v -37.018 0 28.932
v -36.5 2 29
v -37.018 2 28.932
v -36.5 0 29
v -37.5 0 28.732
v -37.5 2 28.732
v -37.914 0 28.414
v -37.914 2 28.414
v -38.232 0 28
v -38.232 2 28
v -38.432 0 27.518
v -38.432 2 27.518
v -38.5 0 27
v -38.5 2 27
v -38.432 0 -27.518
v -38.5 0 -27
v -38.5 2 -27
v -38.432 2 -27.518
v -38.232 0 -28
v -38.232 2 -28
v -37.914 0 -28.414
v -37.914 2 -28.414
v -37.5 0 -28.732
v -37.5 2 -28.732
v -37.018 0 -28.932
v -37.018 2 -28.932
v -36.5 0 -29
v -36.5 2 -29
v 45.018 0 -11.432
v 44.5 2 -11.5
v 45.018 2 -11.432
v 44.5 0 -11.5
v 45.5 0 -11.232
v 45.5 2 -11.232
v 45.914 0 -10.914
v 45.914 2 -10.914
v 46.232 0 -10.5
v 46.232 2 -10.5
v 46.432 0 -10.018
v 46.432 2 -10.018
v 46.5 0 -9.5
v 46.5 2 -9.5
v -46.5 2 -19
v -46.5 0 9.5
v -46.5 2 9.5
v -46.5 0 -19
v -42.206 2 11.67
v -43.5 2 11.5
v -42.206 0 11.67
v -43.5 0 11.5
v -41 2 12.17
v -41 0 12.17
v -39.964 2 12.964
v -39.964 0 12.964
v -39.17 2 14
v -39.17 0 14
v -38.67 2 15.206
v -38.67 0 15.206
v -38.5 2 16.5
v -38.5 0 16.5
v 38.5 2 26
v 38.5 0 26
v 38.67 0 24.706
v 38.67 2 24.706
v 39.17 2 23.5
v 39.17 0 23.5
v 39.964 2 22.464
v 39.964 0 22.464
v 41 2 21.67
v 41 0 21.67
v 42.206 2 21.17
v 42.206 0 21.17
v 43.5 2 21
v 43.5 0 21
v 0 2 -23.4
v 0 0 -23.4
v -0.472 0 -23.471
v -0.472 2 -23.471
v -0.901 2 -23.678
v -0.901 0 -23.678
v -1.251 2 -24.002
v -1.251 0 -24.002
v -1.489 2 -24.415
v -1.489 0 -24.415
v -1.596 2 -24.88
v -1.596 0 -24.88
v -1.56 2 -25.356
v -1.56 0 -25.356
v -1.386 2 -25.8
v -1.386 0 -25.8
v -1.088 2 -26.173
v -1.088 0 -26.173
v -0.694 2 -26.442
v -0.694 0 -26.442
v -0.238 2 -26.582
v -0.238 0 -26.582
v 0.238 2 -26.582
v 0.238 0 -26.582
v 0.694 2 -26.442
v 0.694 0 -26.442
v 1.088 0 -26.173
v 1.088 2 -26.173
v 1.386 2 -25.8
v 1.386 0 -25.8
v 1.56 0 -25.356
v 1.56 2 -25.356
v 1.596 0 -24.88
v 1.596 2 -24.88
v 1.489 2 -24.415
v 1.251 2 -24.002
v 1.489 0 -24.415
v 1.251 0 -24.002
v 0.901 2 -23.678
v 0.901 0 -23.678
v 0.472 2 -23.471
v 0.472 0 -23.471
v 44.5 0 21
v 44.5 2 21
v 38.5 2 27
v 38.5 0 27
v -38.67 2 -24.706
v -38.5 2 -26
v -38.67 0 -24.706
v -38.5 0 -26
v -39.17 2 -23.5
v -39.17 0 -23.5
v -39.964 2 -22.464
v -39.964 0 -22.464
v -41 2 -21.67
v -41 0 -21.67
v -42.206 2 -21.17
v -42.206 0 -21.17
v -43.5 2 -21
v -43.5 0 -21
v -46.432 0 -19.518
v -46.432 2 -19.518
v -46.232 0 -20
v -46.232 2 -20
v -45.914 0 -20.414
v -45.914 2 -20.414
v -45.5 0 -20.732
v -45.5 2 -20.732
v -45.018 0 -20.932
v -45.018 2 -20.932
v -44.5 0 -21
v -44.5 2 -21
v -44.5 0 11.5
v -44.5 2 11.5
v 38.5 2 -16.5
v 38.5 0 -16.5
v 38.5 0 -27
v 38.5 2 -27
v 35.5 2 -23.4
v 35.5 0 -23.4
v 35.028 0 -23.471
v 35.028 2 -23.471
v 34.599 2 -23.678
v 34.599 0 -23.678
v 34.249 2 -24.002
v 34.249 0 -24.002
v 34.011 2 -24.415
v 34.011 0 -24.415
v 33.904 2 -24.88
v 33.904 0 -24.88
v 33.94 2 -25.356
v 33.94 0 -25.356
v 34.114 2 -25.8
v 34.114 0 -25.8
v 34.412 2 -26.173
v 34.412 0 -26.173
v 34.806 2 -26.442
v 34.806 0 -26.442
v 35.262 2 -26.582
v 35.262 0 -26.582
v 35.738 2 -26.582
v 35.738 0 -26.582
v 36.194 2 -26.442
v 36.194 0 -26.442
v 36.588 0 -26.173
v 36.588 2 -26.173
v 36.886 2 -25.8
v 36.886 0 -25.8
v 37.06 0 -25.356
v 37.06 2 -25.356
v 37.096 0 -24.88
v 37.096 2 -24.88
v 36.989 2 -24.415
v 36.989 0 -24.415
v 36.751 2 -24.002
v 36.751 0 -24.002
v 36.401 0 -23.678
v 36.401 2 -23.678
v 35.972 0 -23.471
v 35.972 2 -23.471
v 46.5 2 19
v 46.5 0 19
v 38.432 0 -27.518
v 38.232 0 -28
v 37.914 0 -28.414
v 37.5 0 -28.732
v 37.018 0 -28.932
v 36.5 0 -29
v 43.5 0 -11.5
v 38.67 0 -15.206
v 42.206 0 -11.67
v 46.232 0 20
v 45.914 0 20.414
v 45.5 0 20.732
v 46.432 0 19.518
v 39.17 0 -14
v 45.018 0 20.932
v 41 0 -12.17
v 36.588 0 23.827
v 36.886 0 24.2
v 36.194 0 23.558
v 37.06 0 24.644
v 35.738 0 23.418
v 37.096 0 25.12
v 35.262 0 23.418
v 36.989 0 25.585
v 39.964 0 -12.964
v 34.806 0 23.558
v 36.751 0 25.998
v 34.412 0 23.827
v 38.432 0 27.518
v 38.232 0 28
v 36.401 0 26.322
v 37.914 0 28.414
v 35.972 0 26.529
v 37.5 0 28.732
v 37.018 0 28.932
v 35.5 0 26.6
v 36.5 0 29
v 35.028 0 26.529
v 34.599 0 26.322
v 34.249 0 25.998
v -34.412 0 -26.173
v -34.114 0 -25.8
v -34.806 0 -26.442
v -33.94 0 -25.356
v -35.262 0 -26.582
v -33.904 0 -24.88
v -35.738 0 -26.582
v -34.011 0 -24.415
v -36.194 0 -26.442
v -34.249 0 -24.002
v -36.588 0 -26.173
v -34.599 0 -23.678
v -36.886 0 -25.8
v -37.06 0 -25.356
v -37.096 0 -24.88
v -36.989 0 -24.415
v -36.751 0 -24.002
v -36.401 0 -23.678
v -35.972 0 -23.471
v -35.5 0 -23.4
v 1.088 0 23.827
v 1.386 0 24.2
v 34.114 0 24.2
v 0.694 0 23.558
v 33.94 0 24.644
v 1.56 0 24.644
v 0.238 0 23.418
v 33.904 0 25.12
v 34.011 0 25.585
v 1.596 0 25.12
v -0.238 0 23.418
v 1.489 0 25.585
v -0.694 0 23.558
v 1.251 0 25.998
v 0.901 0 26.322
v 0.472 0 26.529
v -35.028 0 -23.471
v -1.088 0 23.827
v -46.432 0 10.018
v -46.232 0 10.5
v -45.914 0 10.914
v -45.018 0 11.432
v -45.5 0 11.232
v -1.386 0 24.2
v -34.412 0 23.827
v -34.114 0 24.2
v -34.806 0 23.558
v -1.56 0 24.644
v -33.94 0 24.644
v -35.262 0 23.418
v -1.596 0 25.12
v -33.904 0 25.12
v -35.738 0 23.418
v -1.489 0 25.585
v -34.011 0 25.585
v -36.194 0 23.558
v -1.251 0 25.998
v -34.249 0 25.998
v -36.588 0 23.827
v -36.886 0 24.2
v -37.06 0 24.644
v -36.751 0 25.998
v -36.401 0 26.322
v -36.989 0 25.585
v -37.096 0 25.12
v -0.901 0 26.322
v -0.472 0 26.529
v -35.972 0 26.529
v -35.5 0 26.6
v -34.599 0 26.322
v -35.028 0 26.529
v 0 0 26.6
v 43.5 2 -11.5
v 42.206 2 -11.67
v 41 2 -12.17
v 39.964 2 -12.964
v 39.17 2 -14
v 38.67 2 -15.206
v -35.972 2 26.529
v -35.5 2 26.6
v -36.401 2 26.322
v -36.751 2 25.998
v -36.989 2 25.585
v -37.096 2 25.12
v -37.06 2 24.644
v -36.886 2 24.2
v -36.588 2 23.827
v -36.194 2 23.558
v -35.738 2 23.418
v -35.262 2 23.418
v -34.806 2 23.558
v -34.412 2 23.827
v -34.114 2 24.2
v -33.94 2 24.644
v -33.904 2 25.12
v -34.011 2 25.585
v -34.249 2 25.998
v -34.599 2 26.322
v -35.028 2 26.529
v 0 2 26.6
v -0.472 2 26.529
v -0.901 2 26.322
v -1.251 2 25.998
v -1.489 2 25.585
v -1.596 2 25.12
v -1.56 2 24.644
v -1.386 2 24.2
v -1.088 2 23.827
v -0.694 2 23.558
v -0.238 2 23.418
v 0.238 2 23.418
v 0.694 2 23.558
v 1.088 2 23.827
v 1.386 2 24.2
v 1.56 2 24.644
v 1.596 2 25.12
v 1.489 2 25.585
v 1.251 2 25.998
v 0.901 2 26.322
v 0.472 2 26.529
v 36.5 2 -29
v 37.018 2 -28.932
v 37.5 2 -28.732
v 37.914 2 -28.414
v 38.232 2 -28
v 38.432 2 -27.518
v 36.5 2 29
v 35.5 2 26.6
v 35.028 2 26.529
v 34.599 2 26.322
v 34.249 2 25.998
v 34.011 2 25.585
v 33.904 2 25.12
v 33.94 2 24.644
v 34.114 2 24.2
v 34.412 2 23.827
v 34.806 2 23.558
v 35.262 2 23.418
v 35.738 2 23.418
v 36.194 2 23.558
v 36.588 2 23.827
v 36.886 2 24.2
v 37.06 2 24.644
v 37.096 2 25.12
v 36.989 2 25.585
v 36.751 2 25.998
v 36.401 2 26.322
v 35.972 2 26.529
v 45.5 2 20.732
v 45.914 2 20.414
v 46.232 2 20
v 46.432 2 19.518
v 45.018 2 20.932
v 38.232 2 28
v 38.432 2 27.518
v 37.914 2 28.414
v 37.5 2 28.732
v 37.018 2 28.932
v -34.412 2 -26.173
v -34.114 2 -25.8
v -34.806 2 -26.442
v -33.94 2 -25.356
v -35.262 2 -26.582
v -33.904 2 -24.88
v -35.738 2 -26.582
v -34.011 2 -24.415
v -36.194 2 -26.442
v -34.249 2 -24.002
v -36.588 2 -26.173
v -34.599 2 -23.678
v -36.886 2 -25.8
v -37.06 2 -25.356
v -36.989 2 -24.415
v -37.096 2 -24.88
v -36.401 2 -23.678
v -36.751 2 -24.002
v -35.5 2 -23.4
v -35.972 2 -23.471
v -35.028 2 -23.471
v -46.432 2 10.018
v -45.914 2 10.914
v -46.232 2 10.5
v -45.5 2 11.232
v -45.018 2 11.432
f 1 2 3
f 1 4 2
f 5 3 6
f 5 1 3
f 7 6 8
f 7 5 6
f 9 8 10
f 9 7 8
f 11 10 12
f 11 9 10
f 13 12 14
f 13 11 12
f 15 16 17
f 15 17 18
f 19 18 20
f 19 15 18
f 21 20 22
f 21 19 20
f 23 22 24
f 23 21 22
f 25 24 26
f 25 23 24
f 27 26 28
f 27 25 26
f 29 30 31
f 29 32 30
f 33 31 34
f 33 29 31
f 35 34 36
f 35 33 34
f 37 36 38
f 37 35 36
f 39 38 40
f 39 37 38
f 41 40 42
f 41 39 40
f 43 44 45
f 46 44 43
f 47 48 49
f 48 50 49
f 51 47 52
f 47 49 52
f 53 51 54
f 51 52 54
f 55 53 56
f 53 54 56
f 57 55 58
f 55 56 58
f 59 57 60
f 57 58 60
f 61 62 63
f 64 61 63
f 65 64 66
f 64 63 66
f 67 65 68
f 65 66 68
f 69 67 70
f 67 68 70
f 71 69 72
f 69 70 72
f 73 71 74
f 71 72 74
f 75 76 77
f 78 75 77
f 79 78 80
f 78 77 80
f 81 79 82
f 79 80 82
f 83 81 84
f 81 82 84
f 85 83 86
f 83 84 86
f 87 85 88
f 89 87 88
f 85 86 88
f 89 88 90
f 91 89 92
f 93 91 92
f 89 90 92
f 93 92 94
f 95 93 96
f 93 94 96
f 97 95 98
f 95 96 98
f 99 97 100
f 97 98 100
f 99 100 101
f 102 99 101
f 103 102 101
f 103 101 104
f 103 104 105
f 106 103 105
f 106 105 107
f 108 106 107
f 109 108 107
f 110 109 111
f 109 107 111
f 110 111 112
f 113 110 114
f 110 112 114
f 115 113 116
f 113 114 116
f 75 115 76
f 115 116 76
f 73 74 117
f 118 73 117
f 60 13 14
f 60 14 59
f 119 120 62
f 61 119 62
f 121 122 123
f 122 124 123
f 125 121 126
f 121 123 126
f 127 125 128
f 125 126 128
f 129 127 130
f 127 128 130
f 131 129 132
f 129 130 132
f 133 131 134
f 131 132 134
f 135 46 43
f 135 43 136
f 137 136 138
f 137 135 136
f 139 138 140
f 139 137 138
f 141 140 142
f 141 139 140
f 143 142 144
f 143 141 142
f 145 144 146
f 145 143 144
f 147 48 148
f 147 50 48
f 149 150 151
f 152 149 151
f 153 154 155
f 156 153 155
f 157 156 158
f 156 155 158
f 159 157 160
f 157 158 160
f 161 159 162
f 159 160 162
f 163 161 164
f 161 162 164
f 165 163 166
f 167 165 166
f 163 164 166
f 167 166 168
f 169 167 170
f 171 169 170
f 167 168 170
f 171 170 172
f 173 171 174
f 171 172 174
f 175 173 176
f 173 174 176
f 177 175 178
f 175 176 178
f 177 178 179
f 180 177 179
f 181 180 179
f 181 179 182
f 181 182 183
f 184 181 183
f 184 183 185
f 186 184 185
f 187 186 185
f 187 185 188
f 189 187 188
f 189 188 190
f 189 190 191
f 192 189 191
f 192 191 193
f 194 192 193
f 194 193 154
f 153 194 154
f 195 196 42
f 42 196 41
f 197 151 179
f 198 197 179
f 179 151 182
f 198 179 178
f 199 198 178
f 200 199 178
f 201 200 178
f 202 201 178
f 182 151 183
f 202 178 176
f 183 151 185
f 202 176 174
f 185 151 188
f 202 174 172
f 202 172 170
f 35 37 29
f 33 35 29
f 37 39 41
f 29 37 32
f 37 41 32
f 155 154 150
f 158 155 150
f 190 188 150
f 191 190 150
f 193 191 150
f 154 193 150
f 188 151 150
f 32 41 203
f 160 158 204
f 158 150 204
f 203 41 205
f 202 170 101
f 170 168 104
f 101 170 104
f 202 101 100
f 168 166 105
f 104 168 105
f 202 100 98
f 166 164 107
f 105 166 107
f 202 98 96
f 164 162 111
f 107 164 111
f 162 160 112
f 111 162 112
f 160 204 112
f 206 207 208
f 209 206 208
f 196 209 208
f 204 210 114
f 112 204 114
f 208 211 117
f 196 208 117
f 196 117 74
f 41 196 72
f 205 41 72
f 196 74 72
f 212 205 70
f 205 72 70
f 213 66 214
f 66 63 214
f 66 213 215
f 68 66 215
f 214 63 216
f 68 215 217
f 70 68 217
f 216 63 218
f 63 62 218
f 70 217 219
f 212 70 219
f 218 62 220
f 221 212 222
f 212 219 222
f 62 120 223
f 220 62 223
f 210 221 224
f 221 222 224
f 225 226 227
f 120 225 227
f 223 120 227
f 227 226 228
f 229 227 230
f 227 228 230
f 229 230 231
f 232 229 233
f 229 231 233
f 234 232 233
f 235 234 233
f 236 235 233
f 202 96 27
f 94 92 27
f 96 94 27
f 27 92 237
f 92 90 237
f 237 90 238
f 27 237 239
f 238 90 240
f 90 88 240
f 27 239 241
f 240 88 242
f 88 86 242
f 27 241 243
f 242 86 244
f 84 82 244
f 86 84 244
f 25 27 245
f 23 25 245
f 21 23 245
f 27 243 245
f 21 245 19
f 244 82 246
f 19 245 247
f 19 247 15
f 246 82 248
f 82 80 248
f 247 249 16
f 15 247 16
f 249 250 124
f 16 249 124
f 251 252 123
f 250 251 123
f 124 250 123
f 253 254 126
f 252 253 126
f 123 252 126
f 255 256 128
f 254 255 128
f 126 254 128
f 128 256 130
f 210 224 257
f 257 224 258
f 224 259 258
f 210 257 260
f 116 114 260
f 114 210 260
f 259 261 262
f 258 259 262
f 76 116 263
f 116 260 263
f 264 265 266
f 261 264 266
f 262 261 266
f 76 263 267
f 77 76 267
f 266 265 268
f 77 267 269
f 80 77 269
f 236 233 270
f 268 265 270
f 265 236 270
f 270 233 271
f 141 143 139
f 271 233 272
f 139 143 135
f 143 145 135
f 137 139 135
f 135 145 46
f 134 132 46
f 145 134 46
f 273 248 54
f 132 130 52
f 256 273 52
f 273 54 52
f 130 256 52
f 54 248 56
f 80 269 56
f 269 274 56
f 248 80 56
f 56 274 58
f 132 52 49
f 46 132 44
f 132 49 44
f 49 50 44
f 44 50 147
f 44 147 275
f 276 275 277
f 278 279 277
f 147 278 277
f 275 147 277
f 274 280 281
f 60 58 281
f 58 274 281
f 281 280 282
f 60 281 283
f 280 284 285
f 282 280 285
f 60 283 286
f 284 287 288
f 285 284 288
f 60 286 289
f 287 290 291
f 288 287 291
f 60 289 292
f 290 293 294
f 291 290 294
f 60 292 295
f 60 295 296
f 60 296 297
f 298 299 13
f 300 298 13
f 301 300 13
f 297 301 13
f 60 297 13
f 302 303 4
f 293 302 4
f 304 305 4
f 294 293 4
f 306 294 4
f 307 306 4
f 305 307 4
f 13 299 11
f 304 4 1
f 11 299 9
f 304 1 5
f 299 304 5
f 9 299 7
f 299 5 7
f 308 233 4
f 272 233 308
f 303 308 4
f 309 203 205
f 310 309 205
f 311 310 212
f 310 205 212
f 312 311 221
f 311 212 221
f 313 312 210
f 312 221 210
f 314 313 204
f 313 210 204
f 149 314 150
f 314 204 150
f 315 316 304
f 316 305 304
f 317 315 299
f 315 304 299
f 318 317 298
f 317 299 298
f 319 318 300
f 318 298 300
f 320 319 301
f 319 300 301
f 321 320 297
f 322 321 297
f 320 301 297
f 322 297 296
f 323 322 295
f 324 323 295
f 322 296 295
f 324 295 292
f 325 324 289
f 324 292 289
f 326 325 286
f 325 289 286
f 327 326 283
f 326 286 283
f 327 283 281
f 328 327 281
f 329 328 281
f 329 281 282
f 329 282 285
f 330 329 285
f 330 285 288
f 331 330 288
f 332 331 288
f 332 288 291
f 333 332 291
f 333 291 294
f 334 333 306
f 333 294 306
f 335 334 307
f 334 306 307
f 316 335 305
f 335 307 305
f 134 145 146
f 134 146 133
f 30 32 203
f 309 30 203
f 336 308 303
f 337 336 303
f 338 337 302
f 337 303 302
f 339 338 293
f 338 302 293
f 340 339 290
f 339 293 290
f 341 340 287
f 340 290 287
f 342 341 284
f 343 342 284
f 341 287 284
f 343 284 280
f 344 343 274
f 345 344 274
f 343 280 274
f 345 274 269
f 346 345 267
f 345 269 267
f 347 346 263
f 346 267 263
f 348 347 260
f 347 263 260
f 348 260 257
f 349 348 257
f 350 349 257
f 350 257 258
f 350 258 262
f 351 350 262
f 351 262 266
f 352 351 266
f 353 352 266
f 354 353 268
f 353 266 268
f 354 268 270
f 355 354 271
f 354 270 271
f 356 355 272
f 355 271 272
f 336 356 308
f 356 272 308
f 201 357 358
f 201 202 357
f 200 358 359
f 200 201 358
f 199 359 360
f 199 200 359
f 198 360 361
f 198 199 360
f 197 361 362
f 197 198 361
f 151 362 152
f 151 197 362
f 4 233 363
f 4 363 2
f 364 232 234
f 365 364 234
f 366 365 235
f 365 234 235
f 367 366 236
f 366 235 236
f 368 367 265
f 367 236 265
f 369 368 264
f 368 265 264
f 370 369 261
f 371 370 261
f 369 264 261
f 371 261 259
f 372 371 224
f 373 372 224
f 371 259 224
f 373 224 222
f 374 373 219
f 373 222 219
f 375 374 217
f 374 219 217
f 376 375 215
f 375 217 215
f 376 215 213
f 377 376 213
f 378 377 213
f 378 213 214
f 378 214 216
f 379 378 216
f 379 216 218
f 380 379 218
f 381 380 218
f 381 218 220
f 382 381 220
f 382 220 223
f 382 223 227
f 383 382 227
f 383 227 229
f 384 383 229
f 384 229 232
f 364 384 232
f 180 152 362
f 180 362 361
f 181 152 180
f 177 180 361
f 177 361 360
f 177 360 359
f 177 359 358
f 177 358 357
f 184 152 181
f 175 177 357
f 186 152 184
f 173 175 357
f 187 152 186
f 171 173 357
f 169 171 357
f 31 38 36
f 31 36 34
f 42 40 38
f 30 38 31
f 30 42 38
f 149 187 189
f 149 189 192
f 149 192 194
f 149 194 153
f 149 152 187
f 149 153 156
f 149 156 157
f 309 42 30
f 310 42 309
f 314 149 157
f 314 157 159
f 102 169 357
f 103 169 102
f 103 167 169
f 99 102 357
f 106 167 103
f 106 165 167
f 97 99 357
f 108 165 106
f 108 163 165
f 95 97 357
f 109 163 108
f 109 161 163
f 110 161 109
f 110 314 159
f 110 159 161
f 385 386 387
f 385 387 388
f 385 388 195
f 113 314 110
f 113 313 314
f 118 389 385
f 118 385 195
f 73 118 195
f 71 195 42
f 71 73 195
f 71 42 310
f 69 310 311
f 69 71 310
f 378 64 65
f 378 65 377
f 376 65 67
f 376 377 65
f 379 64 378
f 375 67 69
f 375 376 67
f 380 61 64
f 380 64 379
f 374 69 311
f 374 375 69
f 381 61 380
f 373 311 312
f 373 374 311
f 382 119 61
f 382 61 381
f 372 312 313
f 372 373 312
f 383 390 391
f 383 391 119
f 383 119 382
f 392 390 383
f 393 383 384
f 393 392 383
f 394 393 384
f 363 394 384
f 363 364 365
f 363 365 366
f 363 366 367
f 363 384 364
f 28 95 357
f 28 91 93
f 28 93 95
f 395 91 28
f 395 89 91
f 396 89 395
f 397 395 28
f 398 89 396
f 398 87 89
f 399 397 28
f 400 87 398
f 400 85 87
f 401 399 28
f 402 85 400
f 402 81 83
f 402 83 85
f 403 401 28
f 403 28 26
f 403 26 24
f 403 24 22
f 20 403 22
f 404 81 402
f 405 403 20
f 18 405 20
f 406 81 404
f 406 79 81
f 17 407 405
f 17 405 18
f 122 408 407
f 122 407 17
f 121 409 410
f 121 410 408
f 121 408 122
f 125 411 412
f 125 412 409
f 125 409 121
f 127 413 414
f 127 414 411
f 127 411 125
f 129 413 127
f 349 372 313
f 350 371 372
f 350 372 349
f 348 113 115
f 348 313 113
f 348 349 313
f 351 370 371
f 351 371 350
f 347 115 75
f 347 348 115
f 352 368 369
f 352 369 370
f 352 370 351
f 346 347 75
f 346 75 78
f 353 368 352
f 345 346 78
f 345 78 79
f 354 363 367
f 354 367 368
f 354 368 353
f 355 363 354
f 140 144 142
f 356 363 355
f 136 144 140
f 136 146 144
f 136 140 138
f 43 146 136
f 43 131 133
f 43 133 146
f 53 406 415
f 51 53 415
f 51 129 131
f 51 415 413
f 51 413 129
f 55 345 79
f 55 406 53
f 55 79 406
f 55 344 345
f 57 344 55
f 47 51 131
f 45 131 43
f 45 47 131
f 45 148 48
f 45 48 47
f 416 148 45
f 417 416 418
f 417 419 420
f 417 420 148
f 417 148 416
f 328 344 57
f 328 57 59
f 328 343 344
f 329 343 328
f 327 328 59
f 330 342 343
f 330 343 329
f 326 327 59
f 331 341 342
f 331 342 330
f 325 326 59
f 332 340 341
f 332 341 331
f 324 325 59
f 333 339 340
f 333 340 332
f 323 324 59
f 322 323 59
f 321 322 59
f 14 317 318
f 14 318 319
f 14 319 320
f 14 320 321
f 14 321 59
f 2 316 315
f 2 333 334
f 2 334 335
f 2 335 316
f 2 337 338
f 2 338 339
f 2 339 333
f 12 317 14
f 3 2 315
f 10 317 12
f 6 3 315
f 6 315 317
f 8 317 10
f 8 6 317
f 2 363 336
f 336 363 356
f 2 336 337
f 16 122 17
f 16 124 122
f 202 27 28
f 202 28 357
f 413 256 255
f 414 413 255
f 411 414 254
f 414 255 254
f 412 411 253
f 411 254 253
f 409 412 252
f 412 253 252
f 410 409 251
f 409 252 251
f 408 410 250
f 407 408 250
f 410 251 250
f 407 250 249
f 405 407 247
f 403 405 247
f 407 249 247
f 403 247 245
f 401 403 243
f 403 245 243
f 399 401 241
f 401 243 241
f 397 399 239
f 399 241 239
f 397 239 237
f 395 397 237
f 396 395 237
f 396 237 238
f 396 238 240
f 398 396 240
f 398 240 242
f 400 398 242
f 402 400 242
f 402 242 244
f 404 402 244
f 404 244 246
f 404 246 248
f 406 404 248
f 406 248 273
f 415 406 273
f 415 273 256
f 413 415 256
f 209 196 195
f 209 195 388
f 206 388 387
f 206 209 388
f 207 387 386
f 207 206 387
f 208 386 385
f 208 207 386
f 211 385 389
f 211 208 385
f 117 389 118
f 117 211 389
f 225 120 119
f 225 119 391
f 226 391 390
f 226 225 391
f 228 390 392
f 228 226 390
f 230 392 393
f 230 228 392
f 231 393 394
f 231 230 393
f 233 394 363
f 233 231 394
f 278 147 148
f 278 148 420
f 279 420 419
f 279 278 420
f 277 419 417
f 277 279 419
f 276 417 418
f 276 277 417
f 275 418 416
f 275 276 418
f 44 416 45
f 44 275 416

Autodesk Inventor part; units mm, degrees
ref_plane "XZ Plane" through (0, 0, 0) normal (0, 1, 0) x (-1, 0, 0)
sketch "Sketch1" plane through (0, 0, 0) normal (0, 1, 0) x (-1, 0, 0)
  line L0 (-36.5, 29) -> (36.5, 29)
  line L1 (38.5, 27) -> (38.5, 16.5)
  line L2 (43.5, 11.5) -> (44.5, 11.5)
  line L3 (46.5, 9.5) -> (46.5, -19)
  line L4 (44.5, -21) -> (43.5, -21)
  line L5 (38.5, -26) -> (38.5, -27)
  line L6 (36.5, -29) -> (-36.5, -29)
  line L7 (0, 29) -> (0, -29) construction
  arc A0 (44.5, -21) -> (46.5, -19) centre (44.5, -19) ccw
  arc A1 (36.5, -29) -> (38.5, -27) centre (36.5, -27) ccw
  arc A2 (43.5, -21) -> (38.5, -26) centre (43.5, -26) ccw
  arc A3 (38.5, 16.5) -> (43.5, 11.5) centre (43.5, 16.5) ccw
  arc A4 (38.5, 27) -> (36.5, 29) centre (36.5, 27) ccw
  arc A5 (46.5, 9.5) -> (44.5, 11.5) centre (44.5, 9.5) ccw
  line L8 (-38.5, 27) -> (-38.5, 26)
  line L9 (-43.5, 21) -> (-44.5, 21)
  line L10 (-46.5, 19) -> (-46.5, -9.5)
  line L11 (-44.5, -11.5) -> (-43.5, -11.5)
  line L12 (-38.5, -16.5) -> (-38.5, -27)
  arc A6 (-36.5, 29) -> (-38.5, 27) centre (-36.5, 27) ccw
  arc A7 (-44.5, 21) -> (-46.5, 19) centre (-44.5, 19) ccw
  arc A8 (-46.5, -9.5) -> (-44.5, -11.5) centre (-44.5, -9.5) ccw
  arc A9 (-38.5, -27) -> (-36.5, -29) centre (-36.5, -27) ccw
  arc A10 (-43.5, 21) -> (-38.5, 26) centre (-43.5, 26) ccw
  arc A11 (-38.5, -16.5) -> (-43.5, -11.5) centre (-43.5, -16.5) ccw
  point P0 (0, 0)
  point P1 (38.5, 29)
  point P2 (38.5, -21)
  point P3 (38.5, -29)
  point P4 (0, 0)
  point P5 (-38.5, -11.5)
  dimension "d0" = 8
  dimension "d2" = 8
  dimension "d3" = 2
  dimension "d4" = 5
  dimension "d5" = 17.5
  dimension "d6" = 5
  dimension "d7" = 2
  dimension "d8" = 58
  dimension "d9" = 8
  dimension "d10" = 17.5
  dimension "d11" = 8
  dimension "d12" = 93
  dimension "d13" = 2
  dimension "d14" = 5
extrude "Extrusion1" add sketch "Sketch1" along normal blind 2
sketch "Sketch2" plane through (0, 2, 0) normal (0, 1, 0) x (1, 0, 0)
  line L0 (35.5, 25) -> (-35.5, 25) construction
  line L1 (-35.5, 25) -> (-35.5, -25) construction
  line L2 (-35.5, -25) -> (35.5, -25) construction
  line L3 (35.5, -25) -> (35.5, 25) construction
  line L4 (35.5, 25) -> (-35.5, -25) construction
  line L5 (-35.5, 25) -> (35.5, -25) construction
  point P0 (0, 0)
  point P1 (0, -25)
  point P2 (0, 25)
  point P3 (0, 25)
  point P4 (0, -25)
  dimension "d17" = 35.5
  dimension "d18" = 50
hole "Hole1" at (0, 2, 25) at (-35.5, 2, 25) at (-35.5, 2, -25) at (0, 2, -25) at (35.5, 2, 25) at (35.5, 2, -25) direction (0, -1, 0) diameter 3.2 depth 7.5
equation "\"d2\" = d0"
equation "\"d6\" = d4"
equation "\"d7\" = d3"
equation "\"d9\" = d0"
equation "\"d10\" = d5"
equation "\"d11\" = d0"
equation "\"d13\" = d3"
equation "\"d14\" = d4"
properties part number "CH_01_0042_pcb_layout"
